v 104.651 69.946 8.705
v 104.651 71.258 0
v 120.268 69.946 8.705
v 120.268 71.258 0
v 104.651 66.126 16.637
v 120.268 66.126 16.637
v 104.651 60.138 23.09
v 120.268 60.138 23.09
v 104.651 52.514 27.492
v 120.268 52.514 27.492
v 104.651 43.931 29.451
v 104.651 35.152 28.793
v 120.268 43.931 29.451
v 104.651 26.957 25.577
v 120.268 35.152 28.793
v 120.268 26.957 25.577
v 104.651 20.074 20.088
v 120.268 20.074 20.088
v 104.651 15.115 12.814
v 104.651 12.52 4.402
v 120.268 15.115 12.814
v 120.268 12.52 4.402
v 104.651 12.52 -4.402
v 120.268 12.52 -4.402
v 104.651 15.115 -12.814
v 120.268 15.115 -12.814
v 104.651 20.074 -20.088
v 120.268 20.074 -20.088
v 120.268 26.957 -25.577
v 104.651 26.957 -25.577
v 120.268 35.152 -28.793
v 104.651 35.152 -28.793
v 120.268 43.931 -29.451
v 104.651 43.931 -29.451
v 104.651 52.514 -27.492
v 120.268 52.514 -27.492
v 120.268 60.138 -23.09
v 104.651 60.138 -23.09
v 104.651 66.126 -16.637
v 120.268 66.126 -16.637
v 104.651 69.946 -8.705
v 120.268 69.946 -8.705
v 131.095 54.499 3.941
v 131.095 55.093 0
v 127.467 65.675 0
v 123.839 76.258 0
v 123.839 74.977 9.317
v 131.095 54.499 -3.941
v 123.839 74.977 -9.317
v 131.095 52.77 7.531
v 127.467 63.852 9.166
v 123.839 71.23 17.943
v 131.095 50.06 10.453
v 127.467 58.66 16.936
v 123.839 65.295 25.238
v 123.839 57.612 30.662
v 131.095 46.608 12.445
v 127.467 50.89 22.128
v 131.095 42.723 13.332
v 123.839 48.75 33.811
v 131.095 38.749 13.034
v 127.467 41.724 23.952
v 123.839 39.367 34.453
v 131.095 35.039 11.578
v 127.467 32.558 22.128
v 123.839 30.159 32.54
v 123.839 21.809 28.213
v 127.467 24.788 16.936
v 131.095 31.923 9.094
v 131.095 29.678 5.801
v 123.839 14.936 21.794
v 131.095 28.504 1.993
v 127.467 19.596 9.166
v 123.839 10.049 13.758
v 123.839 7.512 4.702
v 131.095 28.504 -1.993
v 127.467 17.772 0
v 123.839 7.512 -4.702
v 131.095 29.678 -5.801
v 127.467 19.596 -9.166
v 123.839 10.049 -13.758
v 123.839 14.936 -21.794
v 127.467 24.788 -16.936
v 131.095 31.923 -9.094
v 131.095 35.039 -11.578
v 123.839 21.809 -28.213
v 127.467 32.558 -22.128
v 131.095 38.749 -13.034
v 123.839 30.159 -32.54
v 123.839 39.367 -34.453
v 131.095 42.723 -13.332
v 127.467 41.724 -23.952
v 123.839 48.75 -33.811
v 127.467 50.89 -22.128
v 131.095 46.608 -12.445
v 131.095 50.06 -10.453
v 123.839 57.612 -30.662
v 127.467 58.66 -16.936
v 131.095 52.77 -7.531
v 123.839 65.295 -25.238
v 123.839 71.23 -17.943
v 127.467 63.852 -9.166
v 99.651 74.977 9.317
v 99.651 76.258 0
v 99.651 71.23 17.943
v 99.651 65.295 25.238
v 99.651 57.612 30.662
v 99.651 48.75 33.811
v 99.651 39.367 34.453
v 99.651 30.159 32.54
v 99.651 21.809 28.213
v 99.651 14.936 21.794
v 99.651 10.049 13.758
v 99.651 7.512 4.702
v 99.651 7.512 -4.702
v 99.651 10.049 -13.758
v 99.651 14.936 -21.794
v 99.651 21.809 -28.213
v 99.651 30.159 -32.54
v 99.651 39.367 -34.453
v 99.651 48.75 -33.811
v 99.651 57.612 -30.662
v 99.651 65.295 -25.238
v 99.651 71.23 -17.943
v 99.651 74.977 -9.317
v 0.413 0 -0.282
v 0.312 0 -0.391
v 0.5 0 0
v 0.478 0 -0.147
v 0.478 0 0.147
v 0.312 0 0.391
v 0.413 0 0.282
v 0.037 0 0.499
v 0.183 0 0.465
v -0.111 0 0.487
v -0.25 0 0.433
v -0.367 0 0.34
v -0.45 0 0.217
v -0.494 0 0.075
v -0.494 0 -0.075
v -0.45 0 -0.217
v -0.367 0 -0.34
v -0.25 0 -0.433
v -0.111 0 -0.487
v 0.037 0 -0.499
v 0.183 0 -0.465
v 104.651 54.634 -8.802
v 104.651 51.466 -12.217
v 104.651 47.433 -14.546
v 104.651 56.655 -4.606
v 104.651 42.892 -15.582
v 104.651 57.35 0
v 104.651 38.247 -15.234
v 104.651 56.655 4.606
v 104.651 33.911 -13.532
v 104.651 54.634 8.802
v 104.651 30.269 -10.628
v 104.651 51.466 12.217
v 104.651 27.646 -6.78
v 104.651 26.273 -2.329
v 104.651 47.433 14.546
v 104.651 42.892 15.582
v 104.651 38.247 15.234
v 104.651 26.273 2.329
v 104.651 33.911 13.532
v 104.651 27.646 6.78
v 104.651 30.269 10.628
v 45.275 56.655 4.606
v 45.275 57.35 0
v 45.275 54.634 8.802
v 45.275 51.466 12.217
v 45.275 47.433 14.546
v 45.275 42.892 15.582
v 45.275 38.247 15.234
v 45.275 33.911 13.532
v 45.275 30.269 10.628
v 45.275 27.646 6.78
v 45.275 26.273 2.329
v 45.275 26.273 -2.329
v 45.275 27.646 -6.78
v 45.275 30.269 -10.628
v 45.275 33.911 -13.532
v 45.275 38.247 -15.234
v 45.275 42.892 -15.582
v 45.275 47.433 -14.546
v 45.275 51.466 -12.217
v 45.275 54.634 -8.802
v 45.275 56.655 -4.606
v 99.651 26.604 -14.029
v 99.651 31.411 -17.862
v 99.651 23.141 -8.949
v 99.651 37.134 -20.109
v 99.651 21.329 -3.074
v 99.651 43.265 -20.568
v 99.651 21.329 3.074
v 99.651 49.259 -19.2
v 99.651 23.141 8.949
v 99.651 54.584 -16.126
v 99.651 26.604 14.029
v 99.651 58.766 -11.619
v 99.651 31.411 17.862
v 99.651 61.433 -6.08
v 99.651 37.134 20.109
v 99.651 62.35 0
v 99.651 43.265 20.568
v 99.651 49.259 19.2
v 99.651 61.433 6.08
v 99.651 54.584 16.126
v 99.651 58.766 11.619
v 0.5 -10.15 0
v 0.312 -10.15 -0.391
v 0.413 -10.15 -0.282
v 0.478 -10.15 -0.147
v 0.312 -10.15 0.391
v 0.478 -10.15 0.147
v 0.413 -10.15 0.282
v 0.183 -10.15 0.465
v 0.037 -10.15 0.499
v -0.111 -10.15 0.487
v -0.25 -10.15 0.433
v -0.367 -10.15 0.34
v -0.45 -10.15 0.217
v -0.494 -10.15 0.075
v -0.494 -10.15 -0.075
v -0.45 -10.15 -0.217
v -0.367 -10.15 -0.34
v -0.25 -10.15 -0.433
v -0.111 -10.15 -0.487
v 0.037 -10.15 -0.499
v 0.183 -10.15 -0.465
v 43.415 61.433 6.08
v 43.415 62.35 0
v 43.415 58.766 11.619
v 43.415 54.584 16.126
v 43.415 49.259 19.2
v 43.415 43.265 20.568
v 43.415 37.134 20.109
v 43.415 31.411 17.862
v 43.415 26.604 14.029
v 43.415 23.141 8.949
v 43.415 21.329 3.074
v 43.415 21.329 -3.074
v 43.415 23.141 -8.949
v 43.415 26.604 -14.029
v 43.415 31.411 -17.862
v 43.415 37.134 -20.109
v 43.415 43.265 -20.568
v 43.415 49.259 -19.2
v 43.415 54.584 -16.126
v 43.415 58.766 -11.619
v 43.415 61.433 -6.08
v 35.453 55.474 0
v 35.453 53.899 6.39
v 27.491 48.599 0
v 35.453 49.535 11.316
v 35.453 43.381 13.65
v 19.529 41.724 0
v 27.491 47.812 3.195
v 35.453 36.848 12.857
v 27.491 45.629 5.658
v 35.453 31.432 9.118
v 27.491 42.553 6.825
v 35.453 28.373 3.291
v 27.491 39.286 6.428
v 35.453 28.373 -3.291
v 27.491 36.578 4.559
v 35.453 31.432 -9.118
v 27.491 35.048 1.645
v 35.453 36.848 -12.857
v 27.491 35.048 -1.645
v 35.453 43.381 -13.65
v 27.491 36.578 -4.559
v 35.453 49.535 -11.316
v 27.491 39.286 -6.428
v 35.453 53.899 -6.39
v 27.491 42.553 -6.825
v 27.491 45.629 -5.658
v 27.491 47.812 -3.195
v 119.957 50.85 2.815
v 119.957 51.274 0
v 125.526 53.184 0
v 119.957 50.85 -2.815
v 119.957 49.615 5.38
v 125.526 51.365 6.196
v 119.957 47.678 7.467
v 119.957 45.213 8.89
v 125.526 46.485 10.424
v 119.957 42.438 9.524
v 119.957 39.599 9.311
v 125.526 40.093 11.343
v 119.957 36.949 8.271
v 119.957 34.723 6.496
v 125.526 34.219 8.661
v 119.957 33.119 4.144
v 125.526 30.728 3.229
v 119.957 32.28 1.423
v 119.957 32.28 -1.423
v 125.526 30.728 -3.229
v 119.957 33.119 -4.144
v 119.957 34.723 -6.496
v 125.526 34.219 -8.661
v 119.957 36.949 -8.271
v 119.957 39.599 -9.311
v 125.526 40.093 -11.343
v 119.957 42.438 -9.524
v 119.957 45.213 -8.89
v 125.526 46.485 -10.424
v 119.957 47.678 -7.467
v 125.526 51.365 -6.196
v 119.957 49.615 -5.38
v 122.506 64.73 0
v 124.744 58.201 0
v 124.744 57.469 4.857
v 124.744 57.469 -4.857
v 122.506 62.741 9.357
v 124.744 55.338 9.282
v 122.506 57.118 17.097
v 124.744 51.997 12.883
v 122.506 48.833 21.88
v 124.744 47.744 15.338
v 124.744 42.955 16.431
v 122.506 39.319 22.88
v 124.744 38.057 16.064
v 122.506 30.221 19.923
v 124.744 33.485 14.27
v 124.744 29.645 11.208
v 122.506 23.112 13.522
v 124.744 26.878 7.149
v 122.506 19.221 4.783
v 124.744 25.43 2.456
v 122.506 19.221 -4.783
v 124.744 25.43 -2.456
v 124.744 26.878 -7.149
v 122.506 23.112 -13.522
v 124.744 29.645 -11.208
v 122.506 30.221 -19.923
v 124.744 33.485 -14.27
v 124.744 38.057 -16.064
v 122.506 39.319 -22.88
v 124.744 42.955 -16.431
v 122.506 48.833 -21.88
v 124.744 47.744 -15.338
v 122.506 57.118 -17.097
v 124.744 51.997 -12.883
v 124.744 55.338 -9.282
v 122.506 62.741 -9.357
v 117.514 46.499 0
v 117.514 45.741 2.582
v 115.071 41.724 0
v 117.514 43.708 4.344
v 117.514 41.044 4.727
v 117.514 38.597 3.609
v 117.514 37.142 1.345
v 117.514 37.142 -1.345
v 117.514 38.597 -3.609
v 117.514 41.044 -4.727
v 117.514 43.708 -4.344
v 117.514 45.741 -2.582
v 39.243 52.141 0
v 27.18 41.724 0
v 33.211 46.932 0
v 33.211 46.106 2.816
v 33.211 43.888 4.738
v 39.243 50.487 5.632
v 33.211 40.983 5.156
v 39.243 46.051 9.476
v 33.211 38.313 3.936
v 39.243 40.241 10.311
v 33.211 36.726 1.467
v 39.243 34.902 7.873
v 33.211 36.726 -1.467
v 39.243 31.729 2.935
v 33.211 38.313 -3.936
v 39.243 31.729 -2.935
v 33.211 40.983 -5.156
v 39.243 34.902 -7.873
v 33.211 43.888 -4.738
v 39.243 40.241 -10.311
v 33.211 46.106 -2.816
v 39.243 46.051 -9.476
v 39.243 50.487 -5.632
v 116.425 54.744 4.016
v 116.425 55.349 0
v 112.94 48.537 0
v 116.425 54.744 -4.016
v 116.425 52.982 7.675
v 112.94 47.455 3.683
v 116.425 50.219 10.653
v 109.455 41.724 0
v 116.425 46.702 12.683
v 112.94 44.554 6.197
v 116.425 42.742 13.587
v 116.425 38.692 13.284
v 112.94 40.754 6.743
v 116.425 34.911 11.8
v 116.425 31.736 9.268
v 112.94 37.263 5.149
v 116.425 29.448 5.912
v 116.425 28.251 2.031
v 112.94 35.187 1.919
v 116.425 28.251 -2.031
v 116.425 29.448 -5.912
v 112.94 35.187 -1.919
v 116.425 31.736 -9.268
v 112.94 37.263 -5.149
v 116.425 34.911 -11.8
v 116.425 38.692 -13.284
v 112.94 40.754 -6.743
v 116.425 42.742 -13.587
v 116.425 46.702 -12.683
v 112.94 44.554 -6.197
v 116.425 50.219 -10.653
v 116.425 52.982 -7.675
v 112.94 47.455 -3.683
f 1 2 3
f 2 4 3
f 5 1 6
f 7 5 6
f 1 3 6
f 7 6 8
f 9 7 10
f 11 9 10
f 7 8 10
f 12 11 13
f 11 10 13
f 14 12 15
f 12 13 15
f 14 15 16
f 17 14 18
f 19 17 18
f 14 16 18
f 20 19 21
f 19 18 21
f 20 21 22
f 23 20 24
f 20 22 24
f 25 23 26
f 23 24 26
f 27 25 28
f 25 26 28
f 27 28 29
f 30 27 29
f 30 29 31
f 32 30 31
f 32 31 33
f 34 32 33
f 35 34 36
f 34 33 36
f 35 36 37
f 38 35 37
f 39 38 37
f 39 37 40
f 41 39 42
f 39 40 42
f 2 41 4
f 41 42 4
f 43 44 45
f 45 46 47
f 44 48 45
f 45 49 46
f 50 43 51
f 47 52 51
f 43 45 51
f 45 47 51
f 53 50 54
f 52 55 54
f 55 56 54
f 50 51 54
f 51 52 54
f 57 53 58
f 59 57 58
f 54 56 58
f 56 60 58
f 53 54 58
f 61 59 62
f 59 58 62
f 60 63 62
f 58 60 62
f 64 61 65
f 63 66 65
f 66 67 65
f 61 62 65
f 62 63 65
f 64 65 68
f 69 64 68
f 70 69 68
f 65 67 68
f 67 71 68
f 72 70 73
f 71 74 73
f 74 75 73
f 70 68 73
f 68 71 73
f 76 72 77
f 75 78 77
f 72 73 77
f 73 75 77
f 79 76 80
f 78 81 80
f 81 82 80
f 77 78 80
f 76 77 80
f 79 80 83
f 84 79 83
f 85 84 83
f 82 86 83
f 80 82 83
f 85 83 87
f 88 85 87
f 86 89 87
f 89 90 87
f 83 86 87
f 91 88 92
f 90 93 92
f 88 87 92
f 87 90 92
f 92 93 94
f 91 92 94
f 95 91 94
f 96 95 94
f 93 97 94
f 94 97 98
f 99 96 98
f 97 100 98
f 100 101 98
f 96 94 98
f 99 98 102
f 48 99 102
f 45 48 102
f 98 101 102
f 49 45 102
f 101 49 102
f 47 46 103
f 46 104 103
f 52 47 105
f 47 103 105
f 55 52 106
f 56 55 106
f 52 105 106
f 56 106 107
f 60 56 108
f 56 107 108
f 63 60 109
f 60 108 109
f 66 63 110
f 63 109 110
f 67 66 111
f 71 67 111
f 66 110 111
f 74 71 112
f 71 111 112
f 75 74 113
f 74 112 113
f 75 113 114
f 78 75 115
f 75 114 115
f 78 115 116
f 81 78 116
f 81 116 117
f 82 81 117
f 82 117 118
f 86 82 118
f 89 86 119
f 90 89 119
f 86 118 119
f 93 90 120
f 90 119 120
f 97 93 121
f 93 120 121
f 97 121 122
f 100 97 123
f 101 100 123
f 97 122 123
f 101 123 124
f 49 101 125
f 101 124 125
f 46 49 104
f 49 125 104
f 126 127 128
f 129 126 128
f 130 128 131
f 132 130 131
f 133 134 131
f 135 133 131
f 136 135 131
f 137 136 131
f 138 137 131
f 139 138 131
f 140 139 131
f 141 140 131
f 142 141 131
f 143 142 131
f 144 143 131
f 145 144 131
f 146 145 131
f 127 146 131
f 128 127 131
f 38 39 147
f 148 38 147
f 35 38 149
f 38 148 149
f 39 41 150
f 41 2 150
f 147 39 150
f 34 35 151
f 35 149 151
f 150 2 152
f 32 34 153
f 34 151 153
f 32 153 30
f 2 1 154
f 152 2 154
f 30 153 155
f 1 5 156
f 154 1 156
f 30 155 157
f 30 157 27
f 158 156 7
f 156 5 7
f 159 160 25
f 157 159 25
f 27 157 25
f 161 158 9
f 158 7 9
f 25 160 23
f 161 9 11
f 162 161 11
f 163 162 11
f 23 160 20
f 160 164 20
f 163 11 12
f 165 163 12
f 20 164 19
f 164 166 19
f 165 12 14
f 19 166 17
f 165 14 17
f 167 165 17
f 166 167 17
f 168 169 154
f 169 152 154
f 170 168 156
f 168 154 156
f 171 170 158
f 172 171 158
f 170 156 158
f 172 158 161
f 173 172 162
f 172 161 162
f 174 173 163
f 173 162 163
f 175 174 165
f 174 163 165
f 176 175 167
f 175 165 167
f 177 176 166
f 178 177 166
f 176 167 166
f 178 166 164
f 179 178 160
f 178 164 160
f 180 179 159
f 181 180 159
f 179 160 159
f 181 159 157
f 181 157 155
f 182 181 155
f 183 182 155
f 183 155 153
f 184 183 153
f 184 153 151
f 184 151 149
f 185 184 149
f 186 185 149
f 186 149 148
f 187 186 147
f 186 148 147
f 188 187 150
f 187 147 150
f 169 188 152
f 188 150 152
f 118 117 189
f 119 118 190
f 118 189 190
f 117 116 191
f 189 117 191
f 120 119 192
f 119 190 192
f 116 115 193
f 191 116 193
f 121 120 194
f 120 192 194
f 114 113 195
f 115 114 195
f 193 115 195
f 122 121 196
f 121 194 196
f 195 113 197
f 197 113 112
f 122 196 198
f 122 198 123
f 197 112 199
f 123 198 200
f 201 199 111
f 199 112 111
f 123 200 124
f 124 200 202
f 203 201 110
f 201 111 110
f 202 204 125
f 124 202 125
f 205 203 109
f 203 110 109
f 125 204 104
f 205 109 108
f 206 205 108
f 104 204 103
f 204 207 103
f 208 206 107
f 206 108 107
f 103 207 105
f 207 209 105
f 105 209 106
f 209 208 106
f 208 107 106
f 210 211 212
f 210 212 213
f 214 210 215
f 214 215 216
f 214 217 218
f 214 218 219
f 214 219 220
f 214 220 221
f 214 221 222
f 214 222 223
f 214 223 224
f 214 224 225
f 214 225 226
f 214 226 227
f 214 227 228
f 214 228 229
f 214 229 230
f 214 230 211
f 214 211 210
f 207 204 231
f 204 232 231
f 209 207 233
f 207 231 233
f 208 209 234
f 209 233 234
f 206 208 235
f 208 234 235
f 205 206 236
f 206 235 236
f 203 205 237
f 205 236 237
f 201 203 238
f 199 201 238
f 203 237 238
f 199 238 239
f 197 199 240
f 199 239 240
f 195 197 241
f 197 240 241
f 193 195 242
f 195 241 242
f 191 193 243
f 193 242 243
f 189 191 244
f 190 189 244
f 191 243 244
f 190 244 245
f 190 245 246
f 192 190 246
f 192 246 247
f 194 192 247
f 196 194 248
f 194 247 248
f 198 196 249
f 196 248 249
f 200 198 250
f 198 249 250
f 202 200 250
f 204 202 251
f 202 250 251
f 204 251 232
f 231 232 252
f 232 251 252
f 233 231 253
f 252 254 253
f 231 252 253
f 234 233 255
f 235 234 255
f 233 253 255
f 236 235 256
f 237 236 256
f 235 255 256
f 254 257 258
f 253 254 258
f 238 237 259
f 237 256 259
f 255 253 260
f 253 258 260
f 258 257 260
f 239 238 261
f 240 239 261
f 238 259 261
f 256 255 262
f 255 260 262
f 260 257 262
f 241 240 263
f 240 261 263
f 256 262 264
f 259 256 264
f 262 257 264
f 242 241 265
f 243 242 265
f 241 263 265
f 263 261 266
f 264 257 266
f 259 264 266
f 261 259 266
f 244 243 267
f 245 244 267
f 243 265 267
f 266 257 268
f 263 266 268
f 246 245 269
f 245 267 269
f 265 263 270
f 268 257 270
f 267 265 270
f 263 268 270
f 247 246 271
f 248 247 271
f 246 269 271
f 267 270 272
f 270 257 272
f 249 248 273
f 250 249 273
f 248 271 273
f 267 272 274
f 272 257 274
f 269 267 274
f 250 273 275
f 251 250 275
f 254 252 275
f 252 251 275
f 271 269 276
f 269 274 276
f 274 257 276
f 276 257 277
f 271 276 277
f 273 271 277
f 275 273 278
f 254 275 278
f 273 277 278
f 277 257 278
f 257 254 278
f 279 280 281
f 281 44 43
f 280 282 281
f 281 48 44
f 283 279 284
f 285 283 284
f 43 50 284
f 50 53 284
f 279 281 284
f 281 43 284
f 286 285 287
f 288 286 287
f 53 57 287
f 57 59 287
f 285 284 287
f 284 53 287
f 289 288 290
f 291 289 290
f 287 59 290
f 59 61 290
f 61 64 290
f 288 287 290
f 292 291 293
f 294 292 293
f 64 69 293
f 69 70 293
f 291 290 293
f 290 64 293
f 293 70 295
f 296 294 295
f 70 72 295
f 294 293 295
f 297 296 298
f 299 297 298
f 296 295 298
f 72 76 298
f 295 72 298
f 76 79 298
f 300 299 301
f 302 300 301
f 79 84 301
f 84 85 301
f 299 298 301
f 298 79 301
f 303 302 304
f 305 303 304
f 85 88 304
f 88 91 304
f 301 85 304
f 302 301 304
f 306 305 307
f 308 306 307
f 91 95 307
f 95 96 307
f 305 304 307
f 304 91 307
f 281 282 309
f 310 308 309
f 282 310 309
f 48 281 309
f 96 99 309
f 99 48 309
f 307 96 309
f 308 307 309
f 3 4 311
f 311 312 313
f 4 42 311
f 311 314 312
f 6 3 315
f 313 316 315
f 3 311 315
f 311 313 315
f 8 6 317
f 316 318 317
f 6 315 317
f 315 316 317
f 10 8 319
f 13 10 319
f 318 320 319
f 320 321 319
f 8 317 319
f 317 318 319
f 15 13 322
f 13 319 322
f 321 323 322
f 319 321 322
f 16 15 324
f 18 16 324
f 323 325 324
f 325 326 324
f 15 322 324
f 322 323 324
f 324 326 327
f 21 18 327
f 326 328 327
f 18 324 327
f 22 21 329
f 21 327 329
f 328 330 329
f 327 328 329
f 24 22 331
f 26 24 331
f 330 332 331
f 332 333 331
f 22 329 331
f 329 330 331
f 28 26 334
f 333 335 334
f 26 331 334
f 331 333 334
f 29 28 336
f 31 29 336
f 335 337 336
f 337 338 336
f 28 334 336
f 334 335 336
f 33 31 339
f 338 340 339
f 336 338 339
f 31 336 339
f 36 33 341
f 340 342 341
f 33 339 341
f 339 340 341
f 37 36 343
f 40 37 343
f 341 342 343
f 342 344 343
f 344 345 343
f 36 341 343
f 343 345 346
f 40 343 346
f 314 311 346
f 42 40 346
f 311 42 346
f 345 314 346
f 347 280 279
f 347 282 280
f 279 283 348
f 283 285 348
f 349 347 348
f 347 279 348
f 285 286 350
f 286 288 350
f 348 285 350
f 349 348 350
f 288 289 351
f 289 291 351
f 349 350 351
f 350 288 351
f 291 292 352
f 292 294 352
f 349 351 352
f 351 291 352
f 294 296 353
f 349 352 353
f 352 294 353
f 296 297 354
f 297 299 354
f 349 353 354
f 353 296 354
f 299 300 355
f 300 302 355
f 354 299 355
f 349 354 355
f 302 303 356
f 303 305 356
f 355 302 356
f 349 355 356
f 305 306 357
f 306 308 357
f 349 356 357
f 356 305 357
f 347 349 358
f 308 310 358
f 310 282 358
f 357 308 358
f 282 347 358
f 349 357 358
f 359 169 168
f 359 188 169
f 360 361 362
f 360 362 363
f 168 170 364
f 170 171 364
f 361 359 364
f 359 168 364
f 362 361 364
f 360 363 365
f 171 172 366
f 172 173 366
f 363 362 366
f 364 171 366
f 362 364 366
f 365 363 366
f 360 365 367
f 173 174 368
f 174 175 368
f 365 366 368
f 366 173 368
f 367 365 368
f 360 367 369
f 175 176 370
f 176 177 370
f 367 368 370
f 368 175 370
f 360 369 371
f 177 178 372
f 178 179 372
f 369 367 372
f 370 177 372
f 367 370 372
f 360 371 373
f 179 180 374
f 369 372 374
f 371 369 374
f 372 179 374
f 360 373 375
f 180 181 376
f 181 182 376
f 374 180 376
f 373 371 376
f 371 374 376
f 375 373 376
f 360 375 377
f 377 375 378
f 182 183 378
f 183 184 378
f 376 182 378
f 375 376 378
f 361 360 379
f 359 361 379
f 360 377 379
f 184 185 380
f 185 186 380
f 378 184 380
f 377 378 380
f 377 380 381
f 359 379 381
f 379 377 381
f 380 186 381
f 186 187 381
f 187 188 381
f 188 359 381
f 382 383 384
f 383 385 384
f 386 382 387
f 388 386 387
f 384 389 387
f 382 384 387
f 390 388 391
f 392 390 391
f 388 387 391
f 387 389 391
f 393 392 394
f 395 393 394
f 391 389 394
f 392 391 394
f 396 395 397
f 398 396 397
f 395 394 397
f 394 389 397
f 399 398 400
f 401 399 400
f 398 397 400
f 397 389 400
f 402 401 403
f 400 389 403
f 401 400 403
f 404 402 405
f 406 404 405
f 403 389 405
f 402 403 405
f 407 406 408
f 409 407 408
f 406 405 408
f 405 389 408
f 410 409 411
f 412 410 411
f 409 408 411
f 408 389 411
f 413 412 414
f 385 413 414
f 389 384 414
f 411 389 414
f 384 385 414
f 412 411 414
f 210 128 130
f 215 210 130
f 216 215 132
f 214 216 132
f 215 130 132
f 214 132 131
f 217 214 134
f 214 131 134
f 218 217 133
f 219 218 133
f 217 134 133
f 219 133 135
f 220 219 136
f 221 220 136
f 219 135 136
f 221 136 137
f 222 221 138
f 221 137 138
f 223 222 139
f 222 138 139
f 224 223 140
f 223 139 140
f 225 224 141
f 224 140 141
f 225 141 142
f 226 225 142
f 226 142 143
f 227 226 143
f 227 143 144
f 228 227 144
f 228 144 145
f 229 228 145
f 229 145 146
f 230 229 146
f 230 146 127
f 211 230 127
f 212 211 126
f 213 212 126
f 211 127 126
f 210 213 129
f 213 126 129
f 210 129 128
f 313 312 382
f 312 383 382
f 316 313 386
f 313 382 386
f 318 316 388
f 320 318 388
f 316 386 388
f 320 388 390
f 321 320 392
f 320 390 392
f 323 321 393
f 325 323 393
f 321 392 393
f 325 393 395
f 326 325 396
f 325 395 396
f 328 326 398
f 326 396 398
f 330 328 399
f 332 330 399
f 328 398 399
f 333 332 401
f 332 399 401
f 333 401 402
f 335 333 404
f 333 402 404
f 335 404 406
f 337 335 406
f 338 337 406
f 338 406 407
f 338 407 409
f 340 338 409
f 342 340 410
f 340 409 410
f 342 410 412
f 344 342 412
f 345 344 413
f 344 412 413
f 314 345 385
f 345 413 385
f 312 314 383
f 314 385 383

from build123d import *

# Parameters (mm, degrees)
F2_R     = 0.5
F3_DEPTH = 10.15


with BuildPart() as f1:
    # F0 (on Top) → F1 (revolve)
    with BuildSketch(Plane.XY):
        Polygon((43.414786, 62.34964), (19.529365, 41.723897), (27.179618, 41.723897), (45.274843, 57.34964), (104.651337, 57.34964), (104.651337, 71.257609), (120.267675, 71.257609), (124.744087, 58.201417), (116.425017, 55.349162), (109.454778, 41.723897), (115.071051, 41.723897), (119.956736, 51.274324), (131.095439, 55.093311), (123.839103, 76.257609), (99.651337, 76.257609), (99.651337, 62.34964), align=None)
    revolve(axis=Axis((71.125335, 41.723897, 0), (1, 0, 0)))


with BuildPart() as f3:
    # F2 (on Front) → F3 (new body)
    with BuildSketch(Plane.XZ):
        Circle(F2_R)
    extrude(amount=F3_DEPTH)


solid = Compound([f1.part, f3.part])
